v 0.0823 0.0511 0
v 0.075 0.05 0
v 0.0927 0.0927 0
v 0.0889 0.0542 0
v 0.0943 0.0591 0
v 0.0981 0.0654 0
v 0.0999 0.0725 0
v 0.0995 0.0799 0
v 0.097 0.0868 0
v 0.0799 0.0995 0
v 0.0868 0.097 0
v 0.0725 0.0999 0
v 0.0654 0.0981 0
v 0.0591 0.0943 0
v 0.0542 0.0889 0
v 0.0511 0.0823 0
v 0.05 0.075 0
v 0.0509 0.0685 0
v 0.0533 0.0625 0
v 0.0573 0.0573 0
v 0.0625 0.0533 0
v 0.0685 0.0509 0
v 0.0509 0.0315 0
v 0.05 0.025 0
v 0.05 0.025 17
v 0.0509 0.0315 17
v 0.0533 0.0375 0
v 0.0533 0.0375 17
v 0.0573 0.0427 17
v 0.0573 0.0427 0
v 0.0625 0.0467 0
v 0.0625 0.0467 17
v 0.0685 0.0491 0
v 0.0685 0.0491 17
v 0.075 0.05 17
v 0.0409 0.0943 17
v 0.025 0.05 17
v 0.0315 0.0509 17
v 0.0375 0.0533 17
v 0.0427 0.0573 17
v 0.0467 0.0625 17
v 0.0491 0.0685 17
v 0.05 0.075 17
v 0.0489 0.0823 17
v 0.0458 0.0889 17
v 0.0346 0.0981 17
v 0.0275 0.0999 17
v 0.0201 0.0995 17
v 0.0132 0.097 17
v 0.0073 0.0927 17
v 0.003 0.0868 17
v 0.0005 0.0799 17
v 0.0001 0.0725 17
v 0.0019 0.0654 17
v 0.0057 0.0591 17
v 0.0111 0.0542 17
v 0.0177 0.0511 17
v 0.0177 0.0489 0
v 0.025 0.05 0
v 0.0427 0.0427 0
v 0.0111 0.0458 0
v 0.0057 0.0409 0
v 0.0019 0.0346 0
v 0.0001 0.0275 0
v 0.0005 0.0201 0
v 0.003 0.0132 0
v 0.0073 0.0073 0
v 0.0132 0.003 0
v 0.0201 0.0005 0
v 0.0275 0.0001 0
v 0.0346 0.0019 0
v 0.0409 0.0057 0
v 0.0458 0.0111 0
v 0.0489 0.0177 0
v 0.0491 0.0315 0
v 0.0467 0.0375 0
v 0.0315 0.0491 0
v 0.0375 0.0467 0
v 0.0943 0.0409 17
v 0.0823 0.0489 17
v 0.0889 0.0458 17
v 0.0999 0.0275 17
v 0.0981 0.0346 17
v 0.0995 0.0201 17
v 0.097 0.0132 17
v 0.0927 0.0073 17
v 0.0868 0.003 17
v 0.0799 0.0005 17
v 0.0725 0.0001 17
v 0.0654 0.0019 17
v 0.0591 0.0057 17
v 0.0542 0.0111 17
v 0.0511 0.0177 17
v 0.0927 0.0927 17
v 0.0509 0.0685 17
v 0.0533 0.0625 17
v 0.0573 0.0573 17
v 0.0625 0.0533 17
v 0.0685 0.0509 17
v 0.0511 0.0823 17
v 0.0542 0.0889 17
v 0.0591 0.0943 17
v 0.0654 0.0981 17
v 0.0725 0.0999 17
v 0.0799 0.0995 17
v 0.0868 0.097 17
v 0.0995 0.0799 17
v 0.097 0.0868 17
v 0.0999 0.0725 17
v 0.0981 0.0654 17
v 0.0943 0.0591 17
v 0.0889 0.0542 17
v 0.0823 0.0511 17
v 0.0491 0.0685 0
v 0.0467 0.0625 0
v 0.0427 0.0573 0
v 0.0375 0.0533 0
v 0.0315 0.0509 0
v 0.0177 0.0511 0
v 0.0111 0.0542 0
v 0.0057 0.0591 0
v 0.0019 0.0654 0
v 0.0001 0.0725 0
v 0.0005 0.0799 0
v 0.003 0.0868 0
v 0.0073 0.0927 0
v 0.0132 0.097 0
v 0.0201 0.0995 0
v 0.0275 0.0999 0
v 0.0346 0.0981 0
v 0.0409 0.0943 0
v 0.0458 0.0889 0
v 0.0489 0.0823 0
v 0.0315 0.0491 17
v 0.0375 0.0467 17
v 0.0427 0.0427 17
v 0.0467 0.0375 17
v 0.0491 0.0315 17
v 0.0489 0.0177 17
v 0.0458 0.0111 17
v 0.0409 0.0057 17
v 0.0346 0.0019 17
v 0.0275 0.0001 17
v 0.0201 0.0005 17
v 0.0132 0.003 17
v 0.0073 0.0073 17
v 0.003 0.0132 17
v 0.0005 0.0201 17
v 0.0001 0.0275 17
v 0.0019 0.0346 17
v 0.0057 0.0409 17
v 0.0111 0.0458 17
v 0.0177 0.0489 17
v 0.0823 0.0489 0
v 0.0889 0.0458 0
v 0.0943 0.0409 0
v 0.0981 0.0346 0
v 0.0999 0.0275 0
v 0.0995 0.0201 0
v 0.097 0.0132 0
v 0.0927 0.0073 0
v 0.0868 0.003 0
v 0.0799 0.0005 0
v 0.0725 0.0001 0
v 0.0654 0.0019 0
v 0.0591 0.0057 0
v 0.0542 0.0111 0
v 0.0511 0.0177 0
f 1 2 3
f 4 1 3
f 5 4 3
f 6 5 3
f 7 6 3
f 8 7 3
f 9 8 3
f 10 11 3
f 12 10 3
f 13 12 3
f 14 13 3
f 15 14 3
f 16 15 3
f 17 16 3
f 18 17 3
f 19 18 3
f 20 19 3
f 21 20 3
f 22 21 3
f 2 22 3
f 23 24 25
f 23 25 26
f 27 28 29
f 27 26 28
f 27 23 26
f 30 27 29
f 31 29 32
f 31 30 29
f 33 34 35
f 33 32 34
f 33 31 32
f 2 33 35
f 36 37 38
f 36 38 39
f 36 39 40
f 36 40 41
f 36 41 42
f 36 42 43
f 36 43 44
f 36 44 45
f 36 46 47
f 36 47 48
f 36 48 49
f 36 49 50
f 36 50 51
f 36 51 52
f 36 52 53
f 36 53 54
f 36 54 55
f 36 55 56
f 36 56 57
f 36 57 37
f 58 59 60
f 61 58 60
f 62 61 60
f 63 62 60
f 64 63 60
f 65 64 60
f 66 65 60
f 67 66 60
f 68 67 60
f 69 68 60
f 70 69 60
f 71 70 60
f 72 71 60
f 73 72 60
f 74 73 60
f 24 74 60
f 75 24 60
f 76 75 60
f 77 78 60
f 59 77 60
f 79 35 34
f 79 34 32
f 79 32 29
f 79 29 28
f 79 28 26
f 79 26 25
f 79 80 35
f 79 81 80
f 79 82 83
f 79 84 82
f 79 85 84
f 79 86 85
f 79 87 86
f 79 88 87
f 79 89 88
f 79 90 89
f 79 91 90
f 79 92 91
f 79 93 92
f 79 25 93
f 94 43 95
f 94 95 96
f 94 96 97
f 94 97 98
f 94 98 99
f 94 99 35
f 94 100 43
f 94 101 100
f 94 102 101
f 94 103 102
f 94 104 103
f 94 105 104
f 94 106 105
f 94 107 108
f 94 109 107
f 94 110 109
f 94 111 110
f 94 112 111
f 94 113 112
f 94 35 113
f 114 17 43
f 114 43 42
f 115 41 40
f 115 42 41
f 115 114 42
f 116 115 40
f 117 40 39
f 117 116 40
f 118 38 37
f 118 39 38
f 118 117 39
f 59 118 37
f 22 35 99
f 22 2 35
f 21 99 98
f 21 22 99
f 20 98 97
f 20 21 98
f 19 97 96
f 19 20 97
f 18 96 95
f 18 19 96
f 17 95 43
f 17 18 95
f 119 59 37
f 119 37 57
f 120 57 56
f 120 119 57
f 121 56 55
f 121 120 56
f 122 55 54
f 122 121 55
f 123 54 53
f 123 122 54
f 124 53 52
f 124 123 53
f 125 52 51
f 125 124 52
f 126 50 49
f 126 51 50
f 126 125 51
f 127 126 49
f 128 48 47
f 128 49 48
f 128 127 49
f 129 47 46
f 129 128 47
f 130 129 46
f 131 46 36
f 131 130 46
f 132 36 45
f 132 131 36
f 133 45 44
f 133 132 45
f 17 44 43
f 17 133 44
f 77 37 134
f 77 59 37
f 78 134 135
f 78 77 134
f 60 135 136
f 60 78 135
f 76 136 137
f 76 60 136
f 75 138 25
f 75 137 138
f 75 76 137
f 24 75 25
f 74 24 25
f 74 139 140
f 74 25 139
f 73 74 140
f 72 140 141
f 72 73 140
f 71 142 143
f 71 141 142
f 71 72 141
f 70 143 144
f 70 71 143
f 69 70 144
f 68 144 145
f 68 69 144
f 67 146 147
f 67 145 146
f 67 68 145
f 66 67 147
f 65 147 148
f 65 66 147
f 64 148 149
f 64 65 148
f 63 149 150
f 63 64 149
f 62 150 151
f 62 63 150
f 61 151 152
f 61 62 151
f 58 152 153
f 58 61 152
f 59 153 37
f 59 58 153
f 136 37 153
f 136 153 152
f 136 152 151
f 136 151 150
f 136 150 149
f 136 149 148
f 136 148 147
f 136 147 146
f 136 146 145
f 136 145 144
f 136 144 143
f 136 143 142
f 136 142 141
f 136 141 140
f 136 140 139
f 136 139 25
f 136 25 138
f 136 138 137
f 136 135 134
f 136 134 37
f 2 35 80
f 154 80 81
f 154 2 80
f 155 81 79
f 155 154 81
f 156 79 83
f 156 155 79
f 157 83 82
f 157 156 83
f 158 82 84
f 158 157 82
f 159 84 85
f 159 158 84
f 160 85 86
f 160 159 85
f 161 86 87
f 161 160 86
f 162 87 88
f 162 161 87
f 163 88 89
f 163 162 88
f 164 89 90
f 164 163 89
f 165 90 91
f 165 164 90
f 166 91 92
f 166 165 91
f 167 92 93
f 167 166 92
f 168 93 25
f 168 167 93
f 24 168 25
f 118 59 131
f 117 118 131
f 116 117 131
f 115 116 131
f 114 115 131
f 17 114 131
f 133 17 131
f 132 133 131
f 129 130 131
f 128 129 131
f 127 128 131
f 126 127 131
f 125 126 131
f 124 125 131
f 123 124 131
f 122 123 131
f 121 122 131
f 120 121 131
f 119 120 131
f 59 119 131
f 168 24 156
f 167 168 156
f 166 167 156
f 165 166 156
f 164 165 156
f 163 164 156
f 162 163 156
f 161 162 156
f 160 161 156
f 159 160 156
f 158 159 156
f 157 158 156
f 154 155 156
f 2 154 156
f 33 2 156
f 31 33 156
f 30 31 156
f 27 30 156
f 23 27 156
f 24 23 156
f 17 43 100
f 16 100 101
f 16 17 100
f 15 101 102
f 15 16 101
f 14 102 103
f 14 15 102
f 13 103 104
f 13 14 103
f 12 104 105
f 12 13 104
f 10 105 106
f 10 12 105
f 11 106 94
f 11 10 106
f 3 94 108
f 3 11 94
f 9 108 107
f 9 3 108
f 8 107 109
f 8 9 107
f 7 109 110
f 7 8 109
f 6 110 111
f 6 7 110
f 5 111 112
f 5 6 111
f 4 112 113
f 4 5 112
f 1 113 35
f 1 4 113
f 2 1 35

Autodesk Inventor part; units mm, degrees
ref_plane "YZ Plane" through (0, 0, 0) normal (1, 0, 0) x (0, 1, 0)
ref_plane "XZ Plane" through (0, 0, 0) normal (0, 1, 0) x (-1, 0, 0)
ref_plane "XY Plane" through (0, 0, 0) normal (0, 0, 1) x (1, 0, 0)
sketch "Sketch2" plane through (0, 0, 0) normal (0, 0, 1) x (1, 0, 0)
  line L0 (0, 0) -> (0.1, 0) construction
  line L1 (0.1, 0) -> (0.1, 0.1)
  line L2 (0.1, 0.1) -> (0, 0.1) construction
  line L3 (0, 0.1) -> (0, 0) construction
  circle A0 centre (0.025, 0.075) radius 0.025
  circle A1 centre (0.075, 0.075) radius 0.025
  circle A2 centre (0.025, 0.025) radius 0.025
  circle A3 centre (0.075, 0.025) radius 0.025
  line L4 (0, 0.05) -> (0.1, 0.05)
  point P0 (0.05, 0.05)
  dimension "d11" = 0.1
  dimension "d12" = 0.1
  dimension "d13" = 0.05
  dimension "d14" = 0.05
  dimension "d16" = 0.05
  dimension "d18" = 0.05
  dimension "d22" = 0.05
  dimension "d23" = 0.05
extrude "Extrusion1" add sketch "Sketch2" along normal blind 17 contours A3 | A2 | A1 | A0
sketch "스케치3" plane through (0, 0, 17) normal (0, 0, 1) x (1, 0, 0)
  arc A0 (0.05, 0.025) -> (0.025, 0.05) centre (0.025, 0.025) ccw construction
  arc A1 (0.025, 0.05) -> (0.05, 0.025) centre (0.025, 0.025) ccw construction
  arc A2 (0.05, 0.075) -> (0.025, 0.05) centre (0.025, 0.075) ccw construction
  arc A3 (0.025, 0.05) -> (0.05, 0.075) centre (0.025, 0.075) ccw construction
  arc A4 (0.075, 0.05) -> (0.05, 0.075) centre (0.075, 0.075) ccw construction
  arc A5 (0.05, 0.075) -> (0.075, 0.05) centre (0.075, 0.075) ccw construction
  arc A6 (0.05, 0.025) -> (0.075, 0.05) centre (0.075, 0.025) ccw construction
  arc A7 (0.075, 0.05) -> (0.05, 0.025) centre (0.075, 0.025) ccw construction
  arc A8 (0.025, 0.05) -> (0.05, 0.075) centre (0.025, 0.075) ccw construction
  arc A9 (0.05, 0.075) -> (0.075, 0.05) centre (0.075, 0.075) ccw construction
  line L0 (0.025, 0.05) -> (0.075, 0.05) construction
  point P0 (0, 0)
  point P1 (0.05, 0.05)
equation "\"d13\" = 0.5 * d12"
equation "\"d14\" = 0.5 * d15"
equation "\"d16\" = 0.5 * d17"
equation "\"d18\" = 0.5 * d19"
equation "\"d15\" = 0.1"
equation "\"d17\" = 0.1"
equation "\"d19\" = 0.1"
properties part number "Tetrode"
